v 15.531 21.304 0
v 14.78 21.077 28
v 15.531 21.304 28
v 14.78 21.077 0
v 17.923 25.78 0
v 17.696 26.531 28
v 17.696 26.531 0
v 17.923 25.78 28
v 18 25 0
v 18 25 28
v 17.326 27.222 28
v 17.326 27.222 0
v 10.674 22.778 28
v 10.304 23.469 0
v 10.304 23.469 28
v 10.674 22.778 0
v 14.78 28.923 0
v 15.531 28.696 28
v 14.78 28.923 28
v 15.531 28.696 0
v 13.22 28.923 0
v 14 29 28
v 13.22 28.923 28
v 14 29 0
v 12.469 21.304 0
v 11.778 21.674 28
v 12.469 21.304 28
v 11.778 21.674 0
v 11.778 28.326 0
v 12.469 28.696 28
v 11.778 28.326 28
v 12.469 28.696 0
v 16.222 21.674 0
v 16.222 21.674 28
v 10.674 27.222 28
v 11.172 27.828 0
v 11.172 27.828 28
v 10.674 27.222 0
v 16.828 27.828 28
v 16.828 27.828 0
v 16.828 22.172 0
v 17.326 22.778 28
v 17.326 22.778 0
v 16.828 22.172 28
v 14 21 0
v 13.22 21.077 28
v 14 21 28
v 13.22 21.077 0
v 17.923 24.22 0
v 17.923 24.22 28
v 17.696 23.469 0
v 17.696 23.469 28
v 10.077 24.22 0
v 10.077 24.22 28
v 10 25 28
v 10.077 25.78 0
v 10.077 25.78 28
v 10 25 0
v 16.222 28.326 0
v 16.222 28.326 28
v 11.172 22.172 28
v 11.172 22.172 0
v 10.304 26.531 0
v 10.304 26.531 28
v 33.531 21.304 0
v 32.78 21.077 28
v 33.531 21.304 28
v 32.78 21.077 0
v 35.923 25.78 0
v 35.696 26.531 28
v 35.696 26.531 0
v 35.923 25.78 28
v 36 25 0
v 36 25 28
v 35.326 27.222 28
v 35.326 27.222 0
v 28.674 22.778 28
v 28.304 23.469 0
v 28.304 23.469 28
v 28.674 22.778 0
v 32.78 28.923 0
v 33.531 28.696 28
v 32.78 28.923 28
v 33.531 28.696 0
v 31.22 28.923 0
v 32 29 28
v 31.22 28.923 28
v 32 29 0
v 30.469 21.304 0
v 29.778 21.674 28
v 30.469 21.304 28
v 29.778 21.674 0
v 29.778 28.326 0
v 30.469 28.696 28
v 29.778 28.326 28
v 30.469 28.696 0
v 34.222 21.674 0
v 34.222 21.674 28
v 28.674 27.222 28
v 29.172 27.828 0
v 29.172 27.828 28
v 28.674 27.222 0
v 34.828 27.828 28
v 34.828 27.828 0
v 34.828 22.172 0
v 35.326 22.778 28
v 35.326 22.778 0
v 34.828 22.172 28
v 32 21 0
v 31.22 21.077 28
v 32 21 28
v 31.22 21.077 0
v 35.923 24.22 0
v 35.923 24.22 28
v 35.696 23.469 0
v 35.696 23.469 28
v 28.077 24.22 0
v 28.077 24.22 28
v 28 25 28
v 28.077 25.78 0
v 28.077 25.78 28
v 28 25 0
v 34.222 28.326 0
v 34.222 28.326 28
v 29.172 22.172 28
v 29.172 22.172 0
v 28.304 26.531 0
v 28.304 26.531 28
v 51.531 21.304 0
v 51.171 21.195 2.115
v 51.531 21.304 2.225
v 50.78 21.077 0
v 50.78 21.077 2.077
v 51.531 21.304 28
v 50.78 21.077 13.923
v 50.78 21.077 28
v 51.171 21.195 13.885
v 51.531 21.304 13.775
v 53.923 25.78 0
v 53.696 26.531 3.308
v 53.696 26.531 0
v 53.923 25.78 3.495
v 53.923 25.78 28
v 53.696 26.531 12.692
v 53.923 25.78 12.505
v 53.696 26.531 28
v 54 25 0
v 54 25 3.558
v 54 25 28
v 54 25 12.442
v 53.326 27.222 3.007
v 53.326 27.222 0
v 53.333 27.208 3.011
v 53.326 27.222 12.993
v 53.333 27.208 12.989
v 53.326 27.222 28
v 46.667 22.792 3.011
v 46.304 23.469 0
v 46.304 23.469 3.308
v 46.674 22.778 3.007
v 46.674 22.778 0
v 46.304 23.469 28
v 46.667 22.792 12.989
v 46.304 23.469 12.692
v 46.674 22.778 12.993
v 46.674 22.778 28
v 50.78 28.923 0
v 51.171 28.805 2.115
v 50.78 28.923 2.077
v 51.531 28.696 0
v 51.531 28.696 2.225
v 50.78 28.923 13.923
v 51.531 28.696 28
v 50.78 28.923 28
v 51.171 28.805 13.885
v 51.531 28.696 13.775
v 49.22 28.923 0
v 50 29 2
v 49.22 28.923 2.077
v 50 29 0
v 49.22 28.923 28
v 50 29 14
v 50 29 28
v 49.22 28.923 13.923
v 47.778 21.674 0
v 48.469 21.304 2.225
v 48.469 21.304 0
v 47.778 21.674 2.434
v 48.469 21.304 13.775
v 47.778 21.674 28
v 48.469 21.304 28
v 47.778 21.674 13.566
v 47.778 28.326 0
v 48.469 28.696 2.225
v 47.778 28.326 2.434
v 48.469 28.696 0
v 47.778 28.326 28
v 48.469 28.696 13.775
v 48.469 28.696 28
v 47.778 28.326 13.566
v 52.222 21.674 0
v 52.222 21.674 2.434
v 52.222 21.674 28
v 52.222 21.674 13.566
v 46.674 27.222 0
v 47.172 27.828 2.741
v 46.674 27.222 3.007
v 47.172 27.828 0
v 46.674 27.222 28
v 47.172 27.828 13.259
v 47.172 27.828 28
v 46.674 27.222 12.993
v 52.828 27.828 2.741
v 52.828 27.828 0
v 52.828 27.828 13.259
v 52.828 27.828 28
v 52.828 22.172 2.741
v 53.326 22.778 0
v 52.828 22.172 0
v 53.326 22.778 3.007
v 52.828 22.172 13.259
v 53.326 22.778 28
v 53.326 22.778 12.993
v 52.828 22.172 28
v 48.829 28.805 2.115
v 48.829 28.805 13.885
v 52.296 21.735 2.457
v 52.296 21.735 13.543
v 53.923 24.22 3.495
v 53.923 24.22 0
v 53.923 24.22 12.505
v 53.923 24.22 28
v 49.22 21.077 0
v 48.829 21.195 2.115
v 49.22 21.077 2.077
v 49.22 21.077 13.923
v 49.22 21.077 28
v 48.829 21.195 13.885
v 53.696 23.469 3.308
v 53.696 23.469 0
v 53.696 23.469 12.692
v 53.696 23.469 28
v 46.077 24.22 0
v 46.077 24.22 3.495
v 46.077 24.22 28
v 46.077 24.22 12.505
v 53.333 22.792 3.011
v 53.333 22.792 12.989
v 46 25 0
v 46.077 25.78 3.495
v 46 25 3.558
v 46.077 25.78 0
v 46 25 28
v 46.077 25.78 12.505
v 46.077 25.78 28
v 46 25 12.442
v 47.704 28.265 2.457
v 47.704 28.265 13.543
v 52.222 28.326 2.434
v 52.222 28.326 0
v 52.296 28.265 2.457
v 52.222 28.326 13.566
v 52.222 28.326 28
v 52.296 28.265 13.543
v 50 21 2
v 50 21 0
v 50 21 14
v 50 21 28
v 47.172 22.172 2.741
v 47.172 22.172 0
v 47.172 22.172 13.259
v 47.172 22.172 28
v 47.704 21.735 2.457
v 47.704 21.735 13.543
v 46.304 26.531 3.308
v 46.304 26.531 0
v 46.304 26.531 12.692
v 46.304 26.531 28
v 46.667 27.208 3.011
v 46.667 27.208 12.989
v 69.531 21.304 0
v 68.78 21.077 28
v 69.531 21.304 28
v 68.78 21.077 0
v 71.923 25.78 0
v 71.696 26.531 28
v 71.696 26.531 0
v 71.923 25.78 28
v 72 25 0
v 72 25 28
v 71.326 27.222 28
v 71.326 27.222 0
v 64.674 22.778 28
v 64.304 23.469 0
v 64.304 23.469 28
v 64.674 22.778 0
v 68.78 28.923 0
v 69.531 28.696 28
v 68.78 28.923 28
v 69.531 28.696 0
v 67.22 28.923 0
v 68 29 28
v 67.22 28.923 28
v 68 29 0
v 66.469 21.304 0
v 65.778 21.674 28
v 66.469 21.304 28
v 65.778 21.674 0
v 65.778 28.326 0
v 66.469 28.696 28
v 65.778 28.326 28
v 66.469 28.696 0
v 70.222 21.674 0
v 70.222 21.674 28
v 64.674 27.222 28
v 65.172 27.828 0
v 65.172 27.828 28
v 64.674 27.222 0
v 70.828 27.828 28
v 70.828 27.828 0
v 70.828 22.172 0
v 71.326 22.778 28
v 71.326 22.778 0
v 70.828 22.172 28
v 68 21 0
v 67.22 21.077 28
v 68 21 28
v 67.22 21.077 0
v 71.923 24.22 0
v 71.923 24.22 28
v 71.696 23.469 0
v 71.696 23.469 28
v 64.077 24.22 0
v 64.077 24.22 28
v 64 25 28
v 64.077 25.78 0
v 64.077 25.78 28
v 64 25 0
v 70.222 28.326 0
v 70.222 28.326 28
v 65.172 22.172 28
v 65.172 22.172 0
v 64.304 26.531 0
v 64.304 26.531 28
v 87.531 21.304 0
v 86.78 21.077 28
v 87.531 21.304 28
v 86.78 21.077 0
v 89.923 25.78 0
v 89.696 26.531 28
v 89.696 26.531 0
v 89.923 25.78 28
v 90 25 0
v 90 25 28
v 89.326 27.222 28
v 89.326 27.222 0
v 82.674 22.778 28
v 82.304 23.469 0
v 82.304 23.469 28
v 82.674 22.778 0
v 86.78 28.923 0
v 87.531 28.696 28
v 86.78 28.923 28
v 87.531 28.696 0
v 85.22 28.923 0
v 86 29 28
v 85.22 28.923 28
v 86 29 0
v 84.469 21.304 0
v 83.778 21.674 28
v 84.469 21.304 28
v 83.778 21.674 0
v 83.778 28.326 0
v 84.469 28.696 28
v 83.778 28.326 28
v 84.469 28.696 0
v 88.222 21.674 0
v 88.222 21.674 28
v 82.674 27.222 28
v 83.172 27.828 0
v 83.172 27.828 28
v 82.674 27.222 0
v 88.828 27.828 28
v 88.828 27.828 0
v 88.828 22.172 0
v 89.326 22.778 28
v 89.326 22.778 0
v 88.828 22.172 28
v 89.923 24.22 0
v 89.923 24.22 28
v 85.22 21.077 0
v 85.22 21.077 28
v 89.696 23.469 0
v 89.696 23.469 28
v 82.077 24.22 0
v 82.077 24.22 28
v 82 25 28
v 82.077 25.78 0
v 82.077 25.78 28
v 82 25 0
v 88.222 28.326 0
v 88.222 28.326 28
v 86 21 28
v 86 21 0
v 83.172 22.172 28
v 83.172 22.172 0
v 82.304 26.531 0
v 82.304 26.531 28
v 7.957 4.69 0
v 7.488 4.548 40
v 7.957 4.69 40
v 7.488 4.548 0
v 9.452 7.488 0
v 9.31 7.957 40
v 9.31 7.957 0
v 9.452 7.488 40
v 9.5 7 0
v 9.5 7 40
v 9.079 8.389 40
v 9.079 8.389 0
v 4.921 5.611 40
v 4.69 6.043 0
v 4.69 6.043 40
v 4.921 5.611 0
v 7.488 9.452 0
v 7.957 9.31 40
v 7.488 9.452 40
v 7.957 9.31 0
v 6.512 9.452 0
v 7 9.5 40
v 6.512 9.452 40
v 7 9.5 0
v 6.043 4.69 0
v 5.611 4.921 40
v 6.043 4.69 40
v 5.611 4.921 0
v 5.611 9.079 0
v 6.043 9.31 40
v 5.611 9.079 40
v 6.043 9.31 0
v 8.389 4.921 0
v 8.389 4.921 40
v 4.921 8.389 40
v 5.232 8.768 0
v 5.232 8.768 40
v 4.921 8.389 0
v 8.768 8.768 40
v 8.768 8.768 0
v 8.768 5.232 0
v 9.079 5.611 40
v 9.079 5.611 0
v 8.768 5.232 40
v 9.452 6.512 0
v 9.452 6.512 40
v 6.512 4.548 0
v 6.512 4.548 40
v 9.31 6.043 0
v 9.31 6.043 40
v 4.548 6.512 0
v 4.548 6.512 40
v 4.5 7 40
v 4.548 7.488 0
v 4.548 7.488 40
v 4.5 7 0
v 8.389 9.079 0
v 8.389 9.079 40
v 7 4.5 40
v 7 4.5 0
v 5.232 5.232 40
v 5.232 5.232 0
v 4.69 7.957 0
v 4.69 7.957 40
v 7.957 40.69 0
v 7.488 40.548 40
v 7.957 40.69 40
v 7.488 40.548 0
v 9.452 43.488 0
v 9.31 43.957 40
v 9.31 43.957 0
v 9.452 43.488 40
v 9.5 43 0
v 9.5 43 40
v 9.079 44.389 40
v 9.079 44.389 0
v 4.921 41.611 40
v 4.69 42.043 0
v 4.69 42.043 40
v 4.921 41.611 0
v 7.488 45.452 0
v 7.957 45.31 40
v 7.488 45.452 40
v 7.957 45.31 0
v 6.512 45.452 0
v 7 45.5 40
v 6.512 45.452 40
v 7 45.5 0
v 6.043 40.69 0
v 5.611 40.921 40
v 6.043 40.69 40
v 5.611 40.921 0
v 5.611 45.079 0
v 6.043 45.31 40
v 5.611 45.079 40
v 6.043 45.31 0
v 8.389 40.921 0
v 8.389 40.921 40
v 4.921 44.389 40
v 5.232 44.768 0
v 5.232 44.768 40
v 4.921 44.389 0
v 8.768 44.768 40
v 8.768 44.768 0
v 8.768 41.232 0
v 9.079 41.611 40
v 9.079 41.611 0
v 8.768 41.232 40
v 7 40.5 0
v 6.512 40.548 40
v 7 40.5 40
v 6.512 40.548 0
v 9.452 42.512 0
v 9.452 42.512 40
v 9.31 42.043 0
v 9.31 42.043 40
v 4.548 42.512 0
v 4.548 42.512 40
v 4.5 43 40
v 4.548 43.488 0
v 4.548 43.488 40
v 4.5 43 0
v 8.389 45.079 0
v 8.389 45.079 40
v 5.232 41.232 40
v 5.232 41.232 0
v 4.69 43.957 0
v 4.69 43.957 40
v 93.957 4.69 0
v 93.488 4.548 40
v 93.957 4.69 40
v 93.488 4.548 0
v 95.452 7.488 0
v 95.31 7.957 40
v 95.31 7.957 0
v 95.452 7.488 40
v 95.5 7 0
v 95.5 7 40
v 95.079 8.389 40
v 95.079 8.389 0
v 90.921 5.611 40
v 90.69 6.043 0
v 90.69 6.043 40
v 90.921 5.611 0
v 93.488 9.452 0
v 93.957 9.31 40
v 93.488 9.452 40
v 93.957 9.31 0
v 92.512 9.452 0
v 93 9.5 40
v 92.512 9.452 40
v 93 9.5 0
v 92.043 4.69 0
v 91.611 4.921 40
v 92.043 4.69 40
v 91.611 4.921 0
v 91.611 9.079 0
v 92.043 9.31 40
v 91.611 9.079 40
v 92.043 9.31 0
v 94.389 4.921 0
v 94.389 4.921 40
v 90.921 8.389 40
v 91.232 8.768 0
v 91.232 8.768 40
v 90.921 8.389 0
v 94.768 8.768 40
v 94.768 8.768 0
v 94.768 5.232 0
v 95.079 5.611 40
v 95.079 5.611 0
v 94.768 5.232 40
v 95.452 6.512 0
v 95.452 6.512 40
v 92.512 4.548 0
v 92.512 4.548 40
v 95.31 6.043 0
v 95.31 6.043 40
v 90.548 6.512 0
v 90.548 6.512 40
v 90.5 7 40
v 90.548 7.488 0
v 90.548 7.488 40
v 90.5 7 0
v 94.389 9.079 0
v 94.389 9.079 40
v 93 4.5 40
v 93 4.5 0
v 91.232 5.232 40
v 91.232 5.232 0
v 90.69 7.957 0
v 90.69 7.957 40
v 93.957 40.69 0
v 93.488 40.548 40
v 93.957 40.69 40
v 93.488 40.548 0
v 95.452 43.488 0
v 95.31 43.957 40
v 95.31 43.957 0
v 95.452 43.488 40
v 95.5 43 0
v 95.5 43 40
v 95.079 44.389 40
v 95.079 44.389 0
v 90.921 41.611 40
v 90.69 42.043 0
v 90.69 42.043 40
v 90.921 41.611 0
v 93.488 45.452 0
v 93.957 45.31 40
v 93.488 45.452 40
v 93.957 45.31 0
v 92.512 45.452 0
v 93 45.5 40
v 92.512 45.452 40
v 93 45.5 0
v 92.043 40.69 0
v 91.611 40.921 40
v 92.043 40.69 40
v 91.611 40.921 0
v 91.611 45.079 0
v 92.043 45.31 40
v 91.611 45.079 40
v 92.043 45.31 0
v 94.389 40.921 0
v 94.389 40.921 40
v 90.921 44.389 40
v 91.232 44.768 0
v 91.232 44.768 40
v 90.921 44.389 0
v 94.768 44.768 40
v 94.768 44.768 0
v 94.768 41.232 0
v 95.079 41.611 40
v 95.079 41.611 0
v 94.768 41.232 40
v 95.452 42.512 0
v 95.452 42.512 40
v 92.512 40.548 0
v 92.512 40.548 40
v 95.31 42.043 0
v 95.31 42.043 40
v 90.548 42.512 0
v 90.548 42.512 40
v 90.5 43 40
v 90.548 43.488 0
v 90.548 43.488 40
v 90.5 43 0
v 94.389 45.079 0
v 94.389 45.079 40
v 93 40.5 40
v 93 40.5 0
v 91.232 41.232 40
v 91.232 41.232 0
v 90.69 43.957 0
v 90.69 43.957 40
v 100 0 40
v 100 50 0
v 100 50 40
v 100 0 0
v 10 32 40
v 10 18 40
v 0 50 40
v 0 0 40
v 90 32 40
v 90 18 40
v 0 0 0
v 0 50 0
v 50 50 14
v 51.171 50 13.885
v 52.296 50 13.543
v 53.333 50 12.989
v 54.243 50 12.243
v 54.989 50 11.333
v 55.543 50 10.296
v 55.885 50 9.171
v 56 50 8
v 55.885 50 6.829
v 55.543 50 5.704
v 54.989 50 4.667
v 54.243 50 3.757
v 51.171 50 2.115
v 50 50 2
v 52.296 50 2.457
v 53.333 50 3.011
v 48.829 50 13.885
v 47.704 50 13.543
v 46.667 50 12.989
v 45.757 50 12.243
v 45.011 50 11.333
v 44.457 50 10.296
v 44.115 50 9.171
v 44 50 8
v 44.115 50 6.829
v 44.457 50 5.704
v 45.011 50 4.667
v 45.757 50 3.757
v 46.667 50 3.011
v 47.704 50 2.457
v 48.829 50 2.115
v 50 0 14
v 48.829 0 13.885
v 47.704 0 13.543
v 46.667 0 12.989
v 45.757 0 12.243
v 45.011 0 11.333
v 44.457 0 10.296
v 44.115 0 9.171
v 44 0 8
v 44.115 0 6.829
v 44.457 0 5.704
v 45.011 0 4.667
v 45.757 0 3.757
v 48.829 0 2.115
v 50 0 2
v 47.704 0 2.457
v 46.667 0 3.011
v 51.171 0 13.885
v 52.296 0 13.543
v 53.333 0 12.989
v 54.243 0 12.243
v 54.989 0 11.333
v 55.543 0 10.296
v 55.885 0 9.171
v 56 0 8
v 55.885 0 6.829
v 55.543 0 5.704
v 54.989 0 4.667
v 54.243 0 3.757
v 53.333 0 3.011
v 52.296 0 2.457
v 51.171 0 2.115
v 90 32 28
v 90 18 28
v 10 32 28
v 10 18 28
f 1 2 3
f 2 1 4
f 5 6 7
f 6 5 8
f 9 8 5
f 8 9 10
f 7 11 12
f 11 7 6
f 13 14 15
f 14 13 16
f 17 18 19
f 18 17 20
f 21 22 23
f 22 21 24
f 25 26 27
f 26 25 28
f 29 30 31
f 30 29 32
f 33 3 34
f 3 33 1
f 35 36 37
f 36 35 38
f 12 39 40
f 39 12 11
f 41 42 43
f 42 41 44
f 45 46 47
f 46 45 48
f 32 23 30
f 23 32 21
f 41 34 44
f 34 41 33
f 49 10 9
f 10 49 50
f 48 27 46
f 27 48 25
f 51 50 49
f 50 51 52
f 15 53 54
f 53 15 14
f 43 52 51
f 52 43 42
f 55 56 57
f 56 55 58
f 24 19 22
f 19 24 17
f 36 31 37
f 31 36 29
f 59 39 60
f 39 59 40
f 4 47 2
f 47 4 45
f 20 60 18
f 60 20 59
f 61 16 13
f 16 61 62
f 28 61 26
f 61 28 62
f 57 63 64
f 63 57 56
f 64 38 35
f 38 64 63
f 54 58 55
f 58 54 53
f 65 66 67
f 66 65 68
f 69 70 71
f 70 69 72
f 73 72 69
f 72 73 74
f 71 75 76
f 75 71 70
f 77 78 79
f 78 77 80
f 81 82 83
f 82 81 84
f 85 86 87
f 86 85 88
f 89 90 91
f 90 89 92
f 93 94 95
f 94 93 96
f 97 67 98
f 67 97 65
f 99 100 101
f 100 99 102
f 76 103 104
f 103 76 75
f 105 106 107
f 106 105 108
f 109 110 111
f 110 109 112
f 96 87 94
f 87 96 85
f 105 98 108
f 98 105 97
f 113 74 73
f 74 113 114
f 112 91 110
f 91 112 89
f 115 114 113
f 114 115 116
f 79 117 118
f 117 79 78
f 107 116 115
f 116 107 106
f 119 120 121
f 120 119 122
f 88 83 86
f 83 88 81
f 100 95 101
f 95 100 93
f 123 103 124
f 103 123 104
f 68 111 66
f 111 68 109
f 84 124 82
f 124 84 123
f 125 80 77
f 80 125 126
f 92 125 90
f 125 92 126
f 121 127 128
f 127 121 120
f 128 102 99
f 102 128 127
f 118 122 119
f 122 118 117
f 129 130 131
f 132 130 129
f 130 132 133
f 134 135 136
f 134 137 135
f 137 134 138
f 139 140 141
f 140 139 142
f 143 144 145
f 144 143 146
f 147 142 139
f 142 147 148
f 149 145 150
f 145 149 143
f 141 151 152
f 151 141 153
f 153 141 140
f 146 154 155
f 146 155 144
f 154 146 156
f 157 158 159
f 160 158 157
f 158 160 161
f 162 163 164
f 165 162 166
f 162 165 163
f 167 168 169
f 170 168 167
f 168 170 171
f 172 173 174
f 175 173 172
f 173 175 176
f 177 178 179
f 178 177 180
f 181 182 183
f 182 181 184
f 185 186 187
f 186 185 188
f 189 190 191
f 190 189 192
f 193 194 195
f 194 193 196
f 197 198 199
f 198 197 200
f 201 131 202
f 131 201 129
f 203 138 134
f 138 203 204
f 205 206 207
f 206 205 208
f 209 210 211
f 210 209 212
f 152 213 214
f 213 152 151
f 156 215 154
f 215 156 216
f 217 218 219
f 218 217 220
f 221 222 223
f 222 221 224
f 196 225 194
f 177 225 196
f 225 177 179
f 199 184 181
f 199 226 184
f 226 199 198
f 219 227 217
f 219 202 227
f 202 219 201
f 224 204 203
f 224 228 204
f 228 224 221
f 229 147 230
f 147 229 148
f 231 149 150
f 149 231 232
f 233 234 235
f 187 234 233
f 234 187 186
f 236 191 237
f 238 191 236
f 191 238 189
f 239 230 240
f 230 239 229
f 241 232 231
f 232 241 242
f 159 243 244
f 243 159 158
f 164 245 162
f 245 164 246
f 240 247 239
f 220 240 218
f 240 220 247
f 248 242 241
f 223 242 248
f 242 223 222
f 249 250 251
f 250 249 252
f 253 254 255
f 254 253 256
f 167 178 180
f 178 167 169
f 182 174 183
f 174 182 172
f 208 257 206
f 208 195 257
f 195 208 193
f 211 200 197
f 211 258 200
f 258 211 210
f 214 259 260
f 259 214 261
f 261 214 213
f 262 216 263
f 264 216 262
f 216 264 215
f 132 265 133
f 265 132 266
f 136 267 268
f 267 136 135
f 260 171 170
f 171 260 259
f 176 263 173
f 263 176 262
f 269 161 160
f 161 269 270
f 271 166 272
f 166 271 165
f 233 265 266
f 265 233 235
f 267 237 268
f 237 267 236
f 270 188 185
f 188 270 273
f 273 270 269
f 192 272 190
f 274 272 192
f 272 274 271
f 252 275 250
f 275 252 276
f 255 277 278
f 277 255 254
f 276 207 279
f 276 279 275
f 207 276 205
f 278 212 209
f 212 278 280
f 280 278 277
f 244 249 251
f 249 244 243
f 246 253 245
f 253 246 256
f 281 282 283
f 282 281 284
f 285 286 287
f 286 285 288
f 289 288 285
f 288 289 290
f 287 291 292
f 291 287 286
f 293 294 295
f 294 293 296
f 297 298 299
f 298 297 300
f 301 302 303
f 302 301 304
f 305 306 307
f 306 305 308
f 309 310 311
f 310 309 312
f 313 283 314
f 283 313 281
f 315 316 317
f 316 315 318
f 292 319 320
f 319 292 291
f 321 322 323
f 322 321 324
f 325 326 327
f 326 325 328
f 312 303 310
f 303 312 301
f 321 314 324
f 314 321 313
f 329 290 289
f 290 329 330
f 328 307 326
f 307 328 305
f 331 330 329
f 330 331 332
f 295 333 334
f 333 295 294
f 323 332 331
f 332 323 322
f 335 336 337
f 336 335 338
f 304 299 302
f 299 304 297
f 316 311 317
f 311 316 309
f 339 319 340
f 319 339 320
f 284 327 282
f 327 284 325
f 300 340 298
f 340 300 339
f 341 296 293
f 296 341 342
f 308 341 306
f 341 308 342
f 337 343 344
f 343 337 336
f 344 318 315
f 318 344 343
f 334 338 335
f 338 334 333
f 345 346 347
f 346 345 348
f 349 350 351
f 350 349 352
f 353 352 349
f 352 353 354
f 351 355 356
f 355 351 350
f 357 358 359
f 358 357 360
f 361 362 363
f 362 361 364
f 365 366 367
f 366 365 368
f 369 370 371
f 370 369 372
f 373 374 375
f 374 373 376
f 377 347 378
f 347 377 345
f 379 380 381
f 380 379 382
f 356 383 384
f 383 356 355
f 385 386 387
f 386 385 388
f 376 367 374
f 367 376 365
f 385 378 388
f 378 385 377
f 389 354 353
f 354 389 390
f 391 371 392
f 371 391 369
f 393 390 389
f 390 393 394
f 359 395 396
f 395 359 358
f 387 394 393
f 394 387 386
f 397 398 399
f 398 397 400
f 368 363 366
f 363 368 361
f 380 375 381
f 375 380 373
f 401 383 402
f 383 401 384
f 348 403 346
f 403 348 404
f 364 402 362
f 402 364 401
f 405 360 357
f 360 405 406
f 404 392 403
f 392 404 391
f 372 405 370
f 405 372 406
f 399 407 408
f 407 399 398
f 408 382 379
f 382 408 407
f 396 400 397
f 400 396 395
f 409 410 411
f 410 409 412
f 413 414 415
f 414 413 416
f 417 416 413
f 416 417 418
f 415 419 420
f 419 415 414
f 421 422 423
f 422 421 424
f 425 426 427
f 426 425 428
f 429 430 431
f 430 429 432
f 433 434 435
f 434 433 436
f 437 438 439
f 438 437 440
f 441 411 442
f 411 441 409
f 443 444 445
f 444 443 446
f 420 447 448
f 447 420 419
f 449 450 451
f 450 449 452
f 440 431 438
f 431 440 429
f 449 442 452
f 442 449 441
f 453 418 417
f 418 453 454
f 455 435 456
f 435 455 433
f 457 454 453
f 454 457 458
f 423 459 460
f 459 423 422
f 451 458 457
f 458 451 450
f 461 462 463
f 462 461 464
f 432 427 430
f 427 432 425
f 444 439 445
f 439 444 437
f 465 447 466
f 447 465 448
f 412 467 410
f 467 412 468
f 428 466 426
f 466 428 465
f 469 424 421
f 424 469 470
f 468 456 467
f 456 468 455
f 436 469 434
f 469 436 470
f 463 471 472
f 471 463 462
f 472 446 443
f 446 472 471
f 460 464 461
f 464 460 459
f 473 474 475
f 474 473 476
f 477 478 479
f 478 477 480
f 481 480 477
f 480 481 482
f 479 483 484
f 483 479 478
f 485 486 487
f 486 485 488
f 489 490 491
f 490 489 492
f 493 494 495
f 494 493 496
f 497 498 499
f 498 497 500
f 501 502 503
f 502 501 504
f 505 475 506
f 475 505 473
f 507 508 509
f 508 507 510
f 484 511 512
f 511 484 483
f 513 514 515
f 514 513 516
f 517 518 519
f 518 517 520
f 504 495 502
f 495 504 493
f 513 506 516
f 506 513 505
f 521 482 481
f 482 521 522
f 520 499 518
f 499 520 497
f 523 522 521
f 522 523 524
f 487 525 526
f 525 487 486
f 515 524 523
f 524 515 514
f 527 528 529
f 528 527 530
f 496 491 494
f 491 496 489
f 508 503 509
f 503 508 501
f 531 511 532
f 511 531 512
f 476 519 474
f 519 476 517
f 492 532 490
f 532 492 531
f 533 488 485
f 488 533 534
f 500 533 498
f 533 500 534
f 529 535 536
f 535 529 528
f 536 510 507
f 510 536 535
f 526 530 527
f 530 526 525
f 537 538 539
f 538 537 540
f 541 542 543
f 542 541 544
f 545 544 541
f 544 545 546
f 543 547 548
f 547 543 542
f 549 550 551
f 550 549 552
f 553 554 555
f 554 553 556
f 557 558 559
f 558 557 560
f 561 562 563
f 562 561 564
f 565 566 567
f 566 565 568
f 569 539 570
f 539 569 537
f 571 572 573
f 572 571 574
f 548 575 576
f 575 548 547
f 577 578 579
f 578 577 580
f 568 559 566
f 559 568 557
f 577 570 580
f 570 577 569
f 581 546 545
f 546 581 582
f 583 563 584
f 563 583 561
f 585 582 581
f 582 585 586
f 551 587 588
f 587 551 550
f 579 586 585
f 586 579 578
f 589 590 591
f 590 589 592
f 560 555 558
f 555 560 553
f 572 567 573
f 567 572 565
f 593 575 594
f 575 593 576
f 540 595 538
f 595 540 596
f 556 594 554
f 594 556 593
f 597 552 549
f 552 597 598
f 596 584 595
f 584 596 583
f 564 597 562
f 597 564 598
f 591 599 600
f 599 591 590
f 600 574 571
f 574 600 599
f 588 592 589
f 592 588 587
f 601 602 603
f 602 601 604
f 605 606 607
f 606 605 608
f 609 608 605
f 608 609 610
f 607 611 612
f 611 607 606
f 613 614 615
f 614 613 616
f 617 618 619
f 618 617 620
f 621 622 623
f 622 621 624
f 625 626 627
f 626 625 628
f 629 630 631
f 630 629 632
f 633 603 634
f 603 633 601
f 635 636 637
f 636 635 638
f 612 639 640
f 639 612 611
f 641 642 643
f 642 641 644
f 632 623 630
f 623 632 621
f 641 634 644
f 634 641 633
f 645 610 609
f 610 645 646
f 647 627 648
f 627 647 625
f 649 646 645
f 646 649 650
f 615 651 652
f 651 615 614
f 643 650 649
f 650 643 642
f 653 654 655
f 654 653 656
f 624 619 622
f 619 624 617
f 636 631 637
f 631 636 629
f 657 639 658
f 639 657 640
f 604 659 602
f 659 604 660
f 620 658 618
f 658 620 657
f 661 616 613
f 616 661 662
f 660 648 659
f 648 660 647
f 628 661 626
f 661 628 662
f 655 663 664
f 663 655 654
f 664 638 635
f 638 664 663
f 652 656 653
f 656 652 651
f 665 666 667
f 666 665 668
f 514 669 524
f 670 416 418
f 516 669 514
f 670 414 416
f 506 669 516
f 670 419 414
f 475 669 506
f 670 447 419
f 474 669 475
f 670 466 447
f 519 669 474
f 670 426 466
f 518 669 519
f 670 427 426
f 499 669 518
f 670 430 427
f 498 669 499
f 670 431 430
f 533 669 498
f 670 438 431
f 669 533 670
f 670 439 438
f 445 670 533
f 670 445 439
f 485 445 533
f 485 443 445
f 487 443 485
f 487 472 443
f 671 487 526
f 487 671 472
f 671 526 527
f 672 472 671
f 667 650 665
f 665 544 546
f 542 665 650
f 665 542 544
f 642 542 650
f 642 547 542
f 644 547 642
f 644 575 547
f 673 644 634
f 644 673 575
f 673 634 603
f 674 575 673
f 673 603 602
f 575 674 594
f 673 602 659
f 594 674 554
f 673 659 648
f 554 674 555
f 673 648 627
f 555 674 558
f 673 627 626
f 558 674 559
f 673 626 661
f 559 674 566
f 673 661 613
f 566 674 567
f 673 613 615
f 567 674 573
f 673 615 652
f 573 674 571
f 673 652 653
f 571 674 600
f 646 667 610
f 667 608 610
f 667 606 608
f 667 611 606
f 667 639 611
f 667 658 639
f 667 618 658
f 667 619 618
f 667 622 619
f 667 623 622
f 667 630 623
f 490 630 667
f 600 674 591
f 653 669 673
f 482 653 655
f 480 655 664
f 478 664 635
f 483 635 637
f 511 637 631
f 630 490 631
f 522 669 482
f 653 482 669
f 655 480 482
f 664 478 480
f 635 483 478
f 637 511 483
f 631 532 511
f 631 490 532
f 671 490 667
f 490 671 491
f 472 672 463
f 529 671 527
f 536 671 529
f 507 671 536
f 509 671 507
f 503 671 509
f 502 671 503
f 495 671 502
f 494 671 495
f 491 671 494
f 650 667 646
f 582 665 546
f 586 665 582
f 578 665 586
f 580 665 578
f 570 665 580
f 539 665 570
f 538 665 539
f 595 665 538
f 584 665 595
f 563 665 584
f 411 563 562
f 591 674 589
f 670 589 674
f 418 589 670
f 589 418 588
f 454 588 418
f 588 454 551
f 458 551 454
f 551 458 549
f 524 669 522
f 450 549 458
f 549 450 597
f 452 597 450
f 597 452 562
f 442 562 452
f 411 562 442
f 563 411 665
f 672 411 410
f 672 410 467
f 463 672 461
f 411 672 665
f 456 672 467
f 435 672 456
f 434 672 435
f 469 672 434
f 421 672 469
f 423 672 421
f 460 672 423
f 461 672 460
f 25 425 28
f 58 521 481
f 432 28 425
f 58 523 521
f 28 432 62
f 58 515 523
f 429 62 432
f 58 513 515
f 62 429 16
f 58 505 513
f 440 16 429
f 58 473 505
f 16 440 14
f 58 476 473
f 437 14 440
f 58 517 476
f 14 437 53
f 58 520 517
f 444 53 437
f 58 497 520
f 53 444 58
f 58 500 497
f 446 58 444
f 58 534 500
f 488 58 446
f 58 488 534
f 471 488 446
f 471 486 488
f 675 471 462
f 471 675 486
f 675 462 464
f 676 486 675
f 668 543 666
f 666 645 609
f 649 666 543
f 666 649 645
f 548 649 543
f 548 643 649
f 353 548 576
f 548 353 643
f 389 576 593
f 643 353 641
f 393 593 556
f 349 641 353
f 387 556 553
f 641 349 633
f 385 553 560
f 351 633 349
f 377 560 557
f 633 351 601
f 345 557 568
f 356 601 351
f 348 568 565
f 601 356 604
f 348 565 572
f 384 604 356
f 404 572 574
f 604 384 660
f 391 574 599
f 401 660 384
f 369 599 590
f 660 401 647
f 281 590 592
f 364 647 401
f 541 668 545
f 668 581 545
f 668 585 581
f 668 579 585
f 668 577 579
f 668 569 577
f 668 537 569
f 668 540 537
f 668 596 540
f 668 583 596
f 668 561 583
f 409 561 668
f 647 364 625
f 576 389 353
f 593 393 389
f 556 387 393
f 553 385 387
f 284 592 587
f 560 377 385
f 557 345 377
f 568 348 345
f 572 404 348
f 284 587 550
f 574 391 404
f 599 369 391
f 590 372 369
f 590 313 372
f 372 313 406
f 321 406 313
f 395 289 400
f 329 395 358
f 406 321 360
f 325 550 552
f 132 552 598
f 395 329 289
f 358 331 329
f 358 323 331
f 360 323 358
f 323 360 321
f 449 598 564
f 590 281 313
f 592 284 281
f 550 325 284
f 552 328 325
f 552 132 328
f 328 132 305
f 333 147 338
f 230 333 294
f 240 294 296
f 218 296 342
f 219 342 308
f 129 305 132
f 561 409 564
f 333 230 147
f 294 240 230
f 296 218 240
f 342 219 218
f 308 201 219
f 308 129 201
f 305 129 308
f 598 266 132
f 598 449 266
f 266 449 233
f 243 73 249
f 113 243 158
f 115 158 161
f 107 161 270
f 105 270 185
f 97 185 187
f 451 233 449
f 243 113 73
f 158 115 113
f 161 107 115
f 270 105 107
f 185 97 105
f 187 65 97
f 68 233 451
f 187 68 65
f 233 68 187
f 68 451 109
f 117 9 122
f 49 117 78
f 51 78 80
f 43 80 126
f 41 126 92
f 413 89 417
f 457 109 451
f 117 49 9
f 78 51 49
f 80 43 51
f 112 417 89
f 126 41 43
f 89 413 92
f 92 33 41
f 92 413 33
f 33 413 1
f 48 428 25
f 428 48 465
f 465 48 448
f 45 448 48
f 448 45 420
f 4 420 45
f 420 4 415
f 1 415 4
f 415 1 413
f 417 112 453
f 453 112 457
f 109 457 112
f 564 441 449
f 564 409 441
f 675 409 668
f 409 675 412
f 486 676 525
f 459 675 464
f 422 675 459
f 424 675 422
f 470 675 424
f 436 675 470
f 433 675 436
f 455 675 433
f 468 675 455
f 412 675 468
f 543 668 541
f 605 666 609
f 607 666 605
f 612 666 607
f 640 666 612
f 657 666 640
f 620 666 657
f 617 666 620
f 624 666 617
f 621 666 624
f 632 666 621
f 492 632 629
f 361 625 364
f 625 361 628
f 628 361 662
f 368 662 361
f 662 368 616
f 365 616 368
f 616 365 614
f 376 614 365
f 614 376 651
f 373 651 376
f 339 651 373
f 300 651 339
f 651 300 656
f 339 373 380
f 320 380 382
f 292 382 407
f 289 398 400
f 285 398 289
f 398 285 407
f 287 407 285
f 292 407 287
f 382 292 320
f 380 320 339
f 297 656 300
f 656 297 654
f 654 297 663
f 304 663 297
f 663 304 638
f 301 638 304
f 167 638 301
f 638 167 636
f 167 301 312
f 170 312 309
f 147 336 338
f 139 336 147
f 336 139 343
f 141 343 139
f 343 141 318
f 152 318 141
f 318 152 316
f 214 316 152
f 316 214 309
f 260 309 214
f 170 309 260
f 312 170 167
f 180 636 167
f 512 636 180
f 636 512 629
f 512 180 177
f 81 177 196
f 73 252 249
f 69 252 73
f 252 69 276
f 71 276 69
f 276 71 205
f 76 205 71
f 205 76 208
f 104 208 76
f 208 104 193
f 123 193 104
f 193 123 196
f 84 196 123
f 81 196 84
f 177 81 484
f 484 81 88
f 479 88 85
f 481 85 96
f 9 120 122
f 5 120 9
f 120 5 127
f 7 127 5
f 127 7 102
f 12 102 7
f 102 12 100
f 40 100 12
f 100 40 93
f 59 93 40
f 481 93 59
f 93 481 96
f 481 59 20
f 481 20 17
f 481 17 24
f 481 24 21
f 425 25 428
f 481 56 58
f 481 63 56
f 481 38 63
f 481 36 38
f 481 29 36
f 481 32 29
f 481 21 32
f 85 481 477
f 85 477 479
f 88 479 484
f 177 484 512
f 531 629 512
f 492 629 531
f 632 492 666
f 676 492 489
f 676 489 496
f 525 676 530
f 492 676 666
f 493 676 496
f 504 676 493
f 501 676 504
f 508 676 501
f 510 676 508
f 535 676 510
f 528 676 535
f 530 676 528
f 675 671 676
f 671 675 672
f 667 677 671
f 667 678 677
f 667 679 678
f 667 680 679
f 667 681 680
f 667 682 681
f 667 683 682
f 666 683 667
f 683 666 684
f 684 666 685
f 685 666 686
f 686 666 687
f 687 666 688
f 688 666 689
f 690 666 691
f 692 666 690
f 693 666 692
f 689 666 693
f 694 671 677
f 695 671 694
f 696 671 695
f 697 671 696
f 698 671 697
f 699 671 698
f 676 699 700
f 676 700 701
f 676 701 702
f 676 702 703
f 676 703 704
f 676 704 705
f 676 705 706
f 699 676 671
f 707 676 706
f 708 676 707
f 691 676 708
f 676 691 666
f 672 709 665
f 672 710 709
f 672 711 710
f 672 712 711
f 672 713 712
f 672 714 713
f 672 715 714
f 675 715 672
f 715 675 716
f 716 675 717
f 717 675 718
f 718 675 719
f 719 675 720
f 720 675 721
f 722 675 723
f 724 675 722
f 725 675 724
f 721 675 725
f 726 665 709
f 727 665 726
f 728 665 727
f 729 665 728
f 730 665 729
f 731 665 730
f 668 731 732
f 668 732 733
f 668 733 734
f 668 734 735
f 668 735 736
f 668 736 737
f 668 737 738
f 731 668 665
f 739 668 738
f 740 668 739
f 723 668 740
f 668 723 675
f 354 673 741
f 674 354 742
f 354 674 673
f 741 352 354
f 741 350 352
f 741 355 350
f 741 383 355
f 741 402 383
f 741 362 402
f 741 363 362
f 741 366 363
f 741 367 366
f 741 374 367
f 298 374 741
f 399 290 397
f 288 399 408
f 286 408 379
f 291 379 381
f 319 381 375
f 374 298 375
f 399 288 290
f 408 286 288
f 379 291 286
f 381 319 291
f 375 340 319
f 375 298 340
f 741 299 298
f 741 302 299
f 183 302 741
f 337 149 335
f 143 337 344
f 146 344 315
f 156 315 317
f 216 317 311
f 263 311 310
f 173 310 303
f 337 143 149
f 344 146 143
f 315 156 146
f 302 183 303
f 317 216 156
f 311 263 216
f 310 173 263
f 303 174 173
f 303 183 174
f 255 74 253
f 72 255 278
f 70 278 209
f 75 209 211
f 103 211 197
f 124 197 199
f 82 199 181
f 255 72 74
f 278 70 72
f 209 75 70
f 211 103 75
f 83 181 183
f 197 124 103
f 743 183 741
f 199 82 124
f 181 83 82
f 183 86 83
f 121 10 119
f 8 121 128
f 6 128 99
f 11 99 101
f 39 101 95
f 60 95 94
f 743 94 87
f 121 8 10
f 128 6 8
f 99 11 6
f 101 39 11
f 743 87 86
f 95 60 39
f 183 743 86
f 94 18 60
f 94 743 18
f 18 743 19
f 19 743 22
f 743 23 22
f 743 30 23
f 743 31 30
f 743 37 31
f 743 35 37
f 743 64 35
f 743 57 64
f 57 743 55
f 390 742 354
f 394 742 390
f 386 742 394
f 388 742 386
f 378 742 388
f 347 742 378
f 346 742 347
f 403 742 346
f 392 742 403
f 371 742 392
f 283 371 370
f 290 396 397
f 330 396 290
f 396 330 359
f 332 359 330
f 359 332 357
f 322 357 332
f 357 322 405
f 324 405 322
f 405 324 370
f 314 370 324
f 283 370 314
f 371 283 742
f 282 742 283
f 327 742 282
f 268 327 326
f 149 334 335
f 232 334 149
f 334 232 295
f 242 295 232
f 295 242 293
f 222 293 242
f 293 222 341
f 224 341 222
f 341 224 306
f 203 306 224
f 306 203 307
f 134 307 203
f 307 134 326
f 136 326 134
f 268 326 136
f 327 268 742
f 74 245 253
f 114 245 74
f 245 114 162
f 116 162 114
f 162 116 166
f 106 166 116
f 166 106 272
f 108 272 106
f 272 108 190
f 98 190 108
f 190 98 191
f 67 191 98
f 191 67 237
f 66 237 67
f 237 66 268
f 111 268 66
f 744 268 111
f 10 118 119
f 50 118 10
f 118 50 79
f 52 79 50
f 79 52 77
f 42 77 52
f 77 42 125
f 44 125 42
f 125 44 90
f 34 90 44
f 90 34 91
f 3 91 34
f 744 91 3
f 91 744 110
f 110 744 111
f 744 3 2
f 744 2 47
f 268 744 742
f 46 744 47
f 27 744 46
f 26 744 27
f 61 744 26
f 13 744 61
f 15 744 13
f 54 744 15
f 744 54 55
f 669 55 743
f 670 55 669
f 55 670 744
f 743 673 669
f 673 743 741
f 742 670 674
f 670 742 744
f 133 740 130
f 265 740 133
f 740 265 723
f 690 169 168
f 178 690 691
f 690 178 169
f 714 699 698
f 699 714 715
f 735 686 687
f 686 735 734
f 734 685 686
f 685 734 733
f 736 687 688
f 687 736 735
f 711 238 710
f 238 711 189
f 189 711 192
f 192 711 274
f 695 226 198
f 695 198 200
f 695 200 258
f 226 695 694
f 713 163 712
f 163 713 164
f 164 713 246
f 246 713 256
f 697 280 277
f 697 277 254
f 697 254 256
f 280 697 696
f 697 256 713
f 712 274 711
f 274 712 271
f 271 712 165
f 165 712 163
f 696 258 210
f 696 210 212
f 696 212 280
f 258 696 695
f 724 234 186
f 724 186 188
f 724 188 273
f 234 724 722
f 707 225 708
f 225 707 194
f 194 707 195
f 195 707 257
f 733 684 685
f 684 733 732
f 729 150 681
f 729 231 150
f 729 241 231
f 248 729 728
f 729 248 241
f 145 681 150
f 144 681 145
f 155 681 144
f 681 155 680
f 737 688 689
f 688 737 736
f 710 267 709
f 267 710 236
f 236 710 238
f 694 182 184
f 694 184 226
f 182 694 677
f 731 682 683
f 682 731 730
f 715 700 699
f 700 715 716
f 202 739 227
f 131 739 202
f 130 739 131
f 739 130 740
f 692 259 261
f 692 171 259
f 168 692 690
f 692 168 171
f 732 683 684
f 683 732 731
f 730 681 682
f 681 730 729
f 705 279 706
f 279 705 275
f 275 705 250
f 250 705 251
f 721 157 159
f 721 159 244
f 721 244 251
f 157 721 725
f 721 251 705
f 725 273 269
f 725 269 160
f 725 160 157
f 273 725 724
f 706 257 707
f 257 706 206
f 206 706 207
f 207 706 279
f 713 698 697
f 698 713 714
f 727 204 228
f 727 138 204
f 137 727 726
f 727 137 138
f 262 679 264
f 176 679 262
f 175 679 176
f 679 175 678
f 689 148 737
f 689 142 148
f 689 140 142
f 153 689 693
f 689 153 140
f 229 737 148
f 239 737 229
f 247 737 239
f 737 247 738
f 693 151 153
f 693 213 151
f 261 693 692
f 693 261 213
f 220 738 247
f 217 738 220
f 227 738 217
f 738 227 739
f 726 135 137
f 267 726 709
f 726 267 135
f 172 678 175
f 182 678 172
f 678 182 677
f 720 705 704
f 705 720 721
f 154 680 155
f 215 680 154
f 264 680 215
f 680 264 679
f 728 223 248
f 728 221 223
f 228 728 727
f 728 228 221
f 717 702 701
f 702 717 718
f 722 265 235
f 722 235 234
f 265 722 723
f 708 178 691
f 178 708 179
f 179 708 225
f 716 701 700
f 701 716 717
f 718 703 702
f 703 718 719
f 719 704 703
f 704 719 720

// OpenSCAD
$fn = 32;

// ----------------------------------------------------------------------
// Manifold block: side_outlet manifold
// ----------------------------------------------------------------------

// --- parameters (mm) ---
block_l = 100;            // block length, X
block_w = 50;             // block width, Y
block_h = 40;             // block height, Z
port_d = 8;               // port bore diameter
port_pitch = 18;          // port pitch along X
gallery_d = 14;           // top gallery width, Y
gallery_depth = 12;       // gallery pocket depth
wall_p = 10;              // gallery end wall thickness, X
mnt_d = 5;                // mounting hole diameter
mnt_in = 7;               // mounting hole inset from the edges
out_d = 12;               // outlet bore diameter
out_z = 8;                // outlet axis height
fit_tol = 0.1;            // tolerance for press fits, mm
free_tol = 0.3;           // tolerance for clearance fits, mm

n_ports = 5;  // ports in the row
port_x0 = (block_l - (n_ports - 1) * port_pitch) / 2;  // first port X

difference() {
  cube([block_l, block_w, block_h]);
  for (i = [0 : n_ports - 1])
    translate([port_x0 + i * port_pitch, block_w / 2, -1])
      cylinder(h = block_h + 2, d = port_d);
  translate([wall_p, block_w / 2 - gallery_d / 2, block_h - gallery_depth])
    cube([block_l - 2 * wall_p, gallery_d, gallery_depth + 1]);
  for (cx = [mnt_in, block_l - mnt_in])
    for (cy = [mnt_in, block_w - mnt_in])
      translate([cx, cy, -1]) cylinder(h = block_h + 2, d = mnt_d);
  translate([block_l / 2, -1, out_z]) rotate([-90, 0, 0])
    cylinder(h = block_w + 2, d = out_d);
}
